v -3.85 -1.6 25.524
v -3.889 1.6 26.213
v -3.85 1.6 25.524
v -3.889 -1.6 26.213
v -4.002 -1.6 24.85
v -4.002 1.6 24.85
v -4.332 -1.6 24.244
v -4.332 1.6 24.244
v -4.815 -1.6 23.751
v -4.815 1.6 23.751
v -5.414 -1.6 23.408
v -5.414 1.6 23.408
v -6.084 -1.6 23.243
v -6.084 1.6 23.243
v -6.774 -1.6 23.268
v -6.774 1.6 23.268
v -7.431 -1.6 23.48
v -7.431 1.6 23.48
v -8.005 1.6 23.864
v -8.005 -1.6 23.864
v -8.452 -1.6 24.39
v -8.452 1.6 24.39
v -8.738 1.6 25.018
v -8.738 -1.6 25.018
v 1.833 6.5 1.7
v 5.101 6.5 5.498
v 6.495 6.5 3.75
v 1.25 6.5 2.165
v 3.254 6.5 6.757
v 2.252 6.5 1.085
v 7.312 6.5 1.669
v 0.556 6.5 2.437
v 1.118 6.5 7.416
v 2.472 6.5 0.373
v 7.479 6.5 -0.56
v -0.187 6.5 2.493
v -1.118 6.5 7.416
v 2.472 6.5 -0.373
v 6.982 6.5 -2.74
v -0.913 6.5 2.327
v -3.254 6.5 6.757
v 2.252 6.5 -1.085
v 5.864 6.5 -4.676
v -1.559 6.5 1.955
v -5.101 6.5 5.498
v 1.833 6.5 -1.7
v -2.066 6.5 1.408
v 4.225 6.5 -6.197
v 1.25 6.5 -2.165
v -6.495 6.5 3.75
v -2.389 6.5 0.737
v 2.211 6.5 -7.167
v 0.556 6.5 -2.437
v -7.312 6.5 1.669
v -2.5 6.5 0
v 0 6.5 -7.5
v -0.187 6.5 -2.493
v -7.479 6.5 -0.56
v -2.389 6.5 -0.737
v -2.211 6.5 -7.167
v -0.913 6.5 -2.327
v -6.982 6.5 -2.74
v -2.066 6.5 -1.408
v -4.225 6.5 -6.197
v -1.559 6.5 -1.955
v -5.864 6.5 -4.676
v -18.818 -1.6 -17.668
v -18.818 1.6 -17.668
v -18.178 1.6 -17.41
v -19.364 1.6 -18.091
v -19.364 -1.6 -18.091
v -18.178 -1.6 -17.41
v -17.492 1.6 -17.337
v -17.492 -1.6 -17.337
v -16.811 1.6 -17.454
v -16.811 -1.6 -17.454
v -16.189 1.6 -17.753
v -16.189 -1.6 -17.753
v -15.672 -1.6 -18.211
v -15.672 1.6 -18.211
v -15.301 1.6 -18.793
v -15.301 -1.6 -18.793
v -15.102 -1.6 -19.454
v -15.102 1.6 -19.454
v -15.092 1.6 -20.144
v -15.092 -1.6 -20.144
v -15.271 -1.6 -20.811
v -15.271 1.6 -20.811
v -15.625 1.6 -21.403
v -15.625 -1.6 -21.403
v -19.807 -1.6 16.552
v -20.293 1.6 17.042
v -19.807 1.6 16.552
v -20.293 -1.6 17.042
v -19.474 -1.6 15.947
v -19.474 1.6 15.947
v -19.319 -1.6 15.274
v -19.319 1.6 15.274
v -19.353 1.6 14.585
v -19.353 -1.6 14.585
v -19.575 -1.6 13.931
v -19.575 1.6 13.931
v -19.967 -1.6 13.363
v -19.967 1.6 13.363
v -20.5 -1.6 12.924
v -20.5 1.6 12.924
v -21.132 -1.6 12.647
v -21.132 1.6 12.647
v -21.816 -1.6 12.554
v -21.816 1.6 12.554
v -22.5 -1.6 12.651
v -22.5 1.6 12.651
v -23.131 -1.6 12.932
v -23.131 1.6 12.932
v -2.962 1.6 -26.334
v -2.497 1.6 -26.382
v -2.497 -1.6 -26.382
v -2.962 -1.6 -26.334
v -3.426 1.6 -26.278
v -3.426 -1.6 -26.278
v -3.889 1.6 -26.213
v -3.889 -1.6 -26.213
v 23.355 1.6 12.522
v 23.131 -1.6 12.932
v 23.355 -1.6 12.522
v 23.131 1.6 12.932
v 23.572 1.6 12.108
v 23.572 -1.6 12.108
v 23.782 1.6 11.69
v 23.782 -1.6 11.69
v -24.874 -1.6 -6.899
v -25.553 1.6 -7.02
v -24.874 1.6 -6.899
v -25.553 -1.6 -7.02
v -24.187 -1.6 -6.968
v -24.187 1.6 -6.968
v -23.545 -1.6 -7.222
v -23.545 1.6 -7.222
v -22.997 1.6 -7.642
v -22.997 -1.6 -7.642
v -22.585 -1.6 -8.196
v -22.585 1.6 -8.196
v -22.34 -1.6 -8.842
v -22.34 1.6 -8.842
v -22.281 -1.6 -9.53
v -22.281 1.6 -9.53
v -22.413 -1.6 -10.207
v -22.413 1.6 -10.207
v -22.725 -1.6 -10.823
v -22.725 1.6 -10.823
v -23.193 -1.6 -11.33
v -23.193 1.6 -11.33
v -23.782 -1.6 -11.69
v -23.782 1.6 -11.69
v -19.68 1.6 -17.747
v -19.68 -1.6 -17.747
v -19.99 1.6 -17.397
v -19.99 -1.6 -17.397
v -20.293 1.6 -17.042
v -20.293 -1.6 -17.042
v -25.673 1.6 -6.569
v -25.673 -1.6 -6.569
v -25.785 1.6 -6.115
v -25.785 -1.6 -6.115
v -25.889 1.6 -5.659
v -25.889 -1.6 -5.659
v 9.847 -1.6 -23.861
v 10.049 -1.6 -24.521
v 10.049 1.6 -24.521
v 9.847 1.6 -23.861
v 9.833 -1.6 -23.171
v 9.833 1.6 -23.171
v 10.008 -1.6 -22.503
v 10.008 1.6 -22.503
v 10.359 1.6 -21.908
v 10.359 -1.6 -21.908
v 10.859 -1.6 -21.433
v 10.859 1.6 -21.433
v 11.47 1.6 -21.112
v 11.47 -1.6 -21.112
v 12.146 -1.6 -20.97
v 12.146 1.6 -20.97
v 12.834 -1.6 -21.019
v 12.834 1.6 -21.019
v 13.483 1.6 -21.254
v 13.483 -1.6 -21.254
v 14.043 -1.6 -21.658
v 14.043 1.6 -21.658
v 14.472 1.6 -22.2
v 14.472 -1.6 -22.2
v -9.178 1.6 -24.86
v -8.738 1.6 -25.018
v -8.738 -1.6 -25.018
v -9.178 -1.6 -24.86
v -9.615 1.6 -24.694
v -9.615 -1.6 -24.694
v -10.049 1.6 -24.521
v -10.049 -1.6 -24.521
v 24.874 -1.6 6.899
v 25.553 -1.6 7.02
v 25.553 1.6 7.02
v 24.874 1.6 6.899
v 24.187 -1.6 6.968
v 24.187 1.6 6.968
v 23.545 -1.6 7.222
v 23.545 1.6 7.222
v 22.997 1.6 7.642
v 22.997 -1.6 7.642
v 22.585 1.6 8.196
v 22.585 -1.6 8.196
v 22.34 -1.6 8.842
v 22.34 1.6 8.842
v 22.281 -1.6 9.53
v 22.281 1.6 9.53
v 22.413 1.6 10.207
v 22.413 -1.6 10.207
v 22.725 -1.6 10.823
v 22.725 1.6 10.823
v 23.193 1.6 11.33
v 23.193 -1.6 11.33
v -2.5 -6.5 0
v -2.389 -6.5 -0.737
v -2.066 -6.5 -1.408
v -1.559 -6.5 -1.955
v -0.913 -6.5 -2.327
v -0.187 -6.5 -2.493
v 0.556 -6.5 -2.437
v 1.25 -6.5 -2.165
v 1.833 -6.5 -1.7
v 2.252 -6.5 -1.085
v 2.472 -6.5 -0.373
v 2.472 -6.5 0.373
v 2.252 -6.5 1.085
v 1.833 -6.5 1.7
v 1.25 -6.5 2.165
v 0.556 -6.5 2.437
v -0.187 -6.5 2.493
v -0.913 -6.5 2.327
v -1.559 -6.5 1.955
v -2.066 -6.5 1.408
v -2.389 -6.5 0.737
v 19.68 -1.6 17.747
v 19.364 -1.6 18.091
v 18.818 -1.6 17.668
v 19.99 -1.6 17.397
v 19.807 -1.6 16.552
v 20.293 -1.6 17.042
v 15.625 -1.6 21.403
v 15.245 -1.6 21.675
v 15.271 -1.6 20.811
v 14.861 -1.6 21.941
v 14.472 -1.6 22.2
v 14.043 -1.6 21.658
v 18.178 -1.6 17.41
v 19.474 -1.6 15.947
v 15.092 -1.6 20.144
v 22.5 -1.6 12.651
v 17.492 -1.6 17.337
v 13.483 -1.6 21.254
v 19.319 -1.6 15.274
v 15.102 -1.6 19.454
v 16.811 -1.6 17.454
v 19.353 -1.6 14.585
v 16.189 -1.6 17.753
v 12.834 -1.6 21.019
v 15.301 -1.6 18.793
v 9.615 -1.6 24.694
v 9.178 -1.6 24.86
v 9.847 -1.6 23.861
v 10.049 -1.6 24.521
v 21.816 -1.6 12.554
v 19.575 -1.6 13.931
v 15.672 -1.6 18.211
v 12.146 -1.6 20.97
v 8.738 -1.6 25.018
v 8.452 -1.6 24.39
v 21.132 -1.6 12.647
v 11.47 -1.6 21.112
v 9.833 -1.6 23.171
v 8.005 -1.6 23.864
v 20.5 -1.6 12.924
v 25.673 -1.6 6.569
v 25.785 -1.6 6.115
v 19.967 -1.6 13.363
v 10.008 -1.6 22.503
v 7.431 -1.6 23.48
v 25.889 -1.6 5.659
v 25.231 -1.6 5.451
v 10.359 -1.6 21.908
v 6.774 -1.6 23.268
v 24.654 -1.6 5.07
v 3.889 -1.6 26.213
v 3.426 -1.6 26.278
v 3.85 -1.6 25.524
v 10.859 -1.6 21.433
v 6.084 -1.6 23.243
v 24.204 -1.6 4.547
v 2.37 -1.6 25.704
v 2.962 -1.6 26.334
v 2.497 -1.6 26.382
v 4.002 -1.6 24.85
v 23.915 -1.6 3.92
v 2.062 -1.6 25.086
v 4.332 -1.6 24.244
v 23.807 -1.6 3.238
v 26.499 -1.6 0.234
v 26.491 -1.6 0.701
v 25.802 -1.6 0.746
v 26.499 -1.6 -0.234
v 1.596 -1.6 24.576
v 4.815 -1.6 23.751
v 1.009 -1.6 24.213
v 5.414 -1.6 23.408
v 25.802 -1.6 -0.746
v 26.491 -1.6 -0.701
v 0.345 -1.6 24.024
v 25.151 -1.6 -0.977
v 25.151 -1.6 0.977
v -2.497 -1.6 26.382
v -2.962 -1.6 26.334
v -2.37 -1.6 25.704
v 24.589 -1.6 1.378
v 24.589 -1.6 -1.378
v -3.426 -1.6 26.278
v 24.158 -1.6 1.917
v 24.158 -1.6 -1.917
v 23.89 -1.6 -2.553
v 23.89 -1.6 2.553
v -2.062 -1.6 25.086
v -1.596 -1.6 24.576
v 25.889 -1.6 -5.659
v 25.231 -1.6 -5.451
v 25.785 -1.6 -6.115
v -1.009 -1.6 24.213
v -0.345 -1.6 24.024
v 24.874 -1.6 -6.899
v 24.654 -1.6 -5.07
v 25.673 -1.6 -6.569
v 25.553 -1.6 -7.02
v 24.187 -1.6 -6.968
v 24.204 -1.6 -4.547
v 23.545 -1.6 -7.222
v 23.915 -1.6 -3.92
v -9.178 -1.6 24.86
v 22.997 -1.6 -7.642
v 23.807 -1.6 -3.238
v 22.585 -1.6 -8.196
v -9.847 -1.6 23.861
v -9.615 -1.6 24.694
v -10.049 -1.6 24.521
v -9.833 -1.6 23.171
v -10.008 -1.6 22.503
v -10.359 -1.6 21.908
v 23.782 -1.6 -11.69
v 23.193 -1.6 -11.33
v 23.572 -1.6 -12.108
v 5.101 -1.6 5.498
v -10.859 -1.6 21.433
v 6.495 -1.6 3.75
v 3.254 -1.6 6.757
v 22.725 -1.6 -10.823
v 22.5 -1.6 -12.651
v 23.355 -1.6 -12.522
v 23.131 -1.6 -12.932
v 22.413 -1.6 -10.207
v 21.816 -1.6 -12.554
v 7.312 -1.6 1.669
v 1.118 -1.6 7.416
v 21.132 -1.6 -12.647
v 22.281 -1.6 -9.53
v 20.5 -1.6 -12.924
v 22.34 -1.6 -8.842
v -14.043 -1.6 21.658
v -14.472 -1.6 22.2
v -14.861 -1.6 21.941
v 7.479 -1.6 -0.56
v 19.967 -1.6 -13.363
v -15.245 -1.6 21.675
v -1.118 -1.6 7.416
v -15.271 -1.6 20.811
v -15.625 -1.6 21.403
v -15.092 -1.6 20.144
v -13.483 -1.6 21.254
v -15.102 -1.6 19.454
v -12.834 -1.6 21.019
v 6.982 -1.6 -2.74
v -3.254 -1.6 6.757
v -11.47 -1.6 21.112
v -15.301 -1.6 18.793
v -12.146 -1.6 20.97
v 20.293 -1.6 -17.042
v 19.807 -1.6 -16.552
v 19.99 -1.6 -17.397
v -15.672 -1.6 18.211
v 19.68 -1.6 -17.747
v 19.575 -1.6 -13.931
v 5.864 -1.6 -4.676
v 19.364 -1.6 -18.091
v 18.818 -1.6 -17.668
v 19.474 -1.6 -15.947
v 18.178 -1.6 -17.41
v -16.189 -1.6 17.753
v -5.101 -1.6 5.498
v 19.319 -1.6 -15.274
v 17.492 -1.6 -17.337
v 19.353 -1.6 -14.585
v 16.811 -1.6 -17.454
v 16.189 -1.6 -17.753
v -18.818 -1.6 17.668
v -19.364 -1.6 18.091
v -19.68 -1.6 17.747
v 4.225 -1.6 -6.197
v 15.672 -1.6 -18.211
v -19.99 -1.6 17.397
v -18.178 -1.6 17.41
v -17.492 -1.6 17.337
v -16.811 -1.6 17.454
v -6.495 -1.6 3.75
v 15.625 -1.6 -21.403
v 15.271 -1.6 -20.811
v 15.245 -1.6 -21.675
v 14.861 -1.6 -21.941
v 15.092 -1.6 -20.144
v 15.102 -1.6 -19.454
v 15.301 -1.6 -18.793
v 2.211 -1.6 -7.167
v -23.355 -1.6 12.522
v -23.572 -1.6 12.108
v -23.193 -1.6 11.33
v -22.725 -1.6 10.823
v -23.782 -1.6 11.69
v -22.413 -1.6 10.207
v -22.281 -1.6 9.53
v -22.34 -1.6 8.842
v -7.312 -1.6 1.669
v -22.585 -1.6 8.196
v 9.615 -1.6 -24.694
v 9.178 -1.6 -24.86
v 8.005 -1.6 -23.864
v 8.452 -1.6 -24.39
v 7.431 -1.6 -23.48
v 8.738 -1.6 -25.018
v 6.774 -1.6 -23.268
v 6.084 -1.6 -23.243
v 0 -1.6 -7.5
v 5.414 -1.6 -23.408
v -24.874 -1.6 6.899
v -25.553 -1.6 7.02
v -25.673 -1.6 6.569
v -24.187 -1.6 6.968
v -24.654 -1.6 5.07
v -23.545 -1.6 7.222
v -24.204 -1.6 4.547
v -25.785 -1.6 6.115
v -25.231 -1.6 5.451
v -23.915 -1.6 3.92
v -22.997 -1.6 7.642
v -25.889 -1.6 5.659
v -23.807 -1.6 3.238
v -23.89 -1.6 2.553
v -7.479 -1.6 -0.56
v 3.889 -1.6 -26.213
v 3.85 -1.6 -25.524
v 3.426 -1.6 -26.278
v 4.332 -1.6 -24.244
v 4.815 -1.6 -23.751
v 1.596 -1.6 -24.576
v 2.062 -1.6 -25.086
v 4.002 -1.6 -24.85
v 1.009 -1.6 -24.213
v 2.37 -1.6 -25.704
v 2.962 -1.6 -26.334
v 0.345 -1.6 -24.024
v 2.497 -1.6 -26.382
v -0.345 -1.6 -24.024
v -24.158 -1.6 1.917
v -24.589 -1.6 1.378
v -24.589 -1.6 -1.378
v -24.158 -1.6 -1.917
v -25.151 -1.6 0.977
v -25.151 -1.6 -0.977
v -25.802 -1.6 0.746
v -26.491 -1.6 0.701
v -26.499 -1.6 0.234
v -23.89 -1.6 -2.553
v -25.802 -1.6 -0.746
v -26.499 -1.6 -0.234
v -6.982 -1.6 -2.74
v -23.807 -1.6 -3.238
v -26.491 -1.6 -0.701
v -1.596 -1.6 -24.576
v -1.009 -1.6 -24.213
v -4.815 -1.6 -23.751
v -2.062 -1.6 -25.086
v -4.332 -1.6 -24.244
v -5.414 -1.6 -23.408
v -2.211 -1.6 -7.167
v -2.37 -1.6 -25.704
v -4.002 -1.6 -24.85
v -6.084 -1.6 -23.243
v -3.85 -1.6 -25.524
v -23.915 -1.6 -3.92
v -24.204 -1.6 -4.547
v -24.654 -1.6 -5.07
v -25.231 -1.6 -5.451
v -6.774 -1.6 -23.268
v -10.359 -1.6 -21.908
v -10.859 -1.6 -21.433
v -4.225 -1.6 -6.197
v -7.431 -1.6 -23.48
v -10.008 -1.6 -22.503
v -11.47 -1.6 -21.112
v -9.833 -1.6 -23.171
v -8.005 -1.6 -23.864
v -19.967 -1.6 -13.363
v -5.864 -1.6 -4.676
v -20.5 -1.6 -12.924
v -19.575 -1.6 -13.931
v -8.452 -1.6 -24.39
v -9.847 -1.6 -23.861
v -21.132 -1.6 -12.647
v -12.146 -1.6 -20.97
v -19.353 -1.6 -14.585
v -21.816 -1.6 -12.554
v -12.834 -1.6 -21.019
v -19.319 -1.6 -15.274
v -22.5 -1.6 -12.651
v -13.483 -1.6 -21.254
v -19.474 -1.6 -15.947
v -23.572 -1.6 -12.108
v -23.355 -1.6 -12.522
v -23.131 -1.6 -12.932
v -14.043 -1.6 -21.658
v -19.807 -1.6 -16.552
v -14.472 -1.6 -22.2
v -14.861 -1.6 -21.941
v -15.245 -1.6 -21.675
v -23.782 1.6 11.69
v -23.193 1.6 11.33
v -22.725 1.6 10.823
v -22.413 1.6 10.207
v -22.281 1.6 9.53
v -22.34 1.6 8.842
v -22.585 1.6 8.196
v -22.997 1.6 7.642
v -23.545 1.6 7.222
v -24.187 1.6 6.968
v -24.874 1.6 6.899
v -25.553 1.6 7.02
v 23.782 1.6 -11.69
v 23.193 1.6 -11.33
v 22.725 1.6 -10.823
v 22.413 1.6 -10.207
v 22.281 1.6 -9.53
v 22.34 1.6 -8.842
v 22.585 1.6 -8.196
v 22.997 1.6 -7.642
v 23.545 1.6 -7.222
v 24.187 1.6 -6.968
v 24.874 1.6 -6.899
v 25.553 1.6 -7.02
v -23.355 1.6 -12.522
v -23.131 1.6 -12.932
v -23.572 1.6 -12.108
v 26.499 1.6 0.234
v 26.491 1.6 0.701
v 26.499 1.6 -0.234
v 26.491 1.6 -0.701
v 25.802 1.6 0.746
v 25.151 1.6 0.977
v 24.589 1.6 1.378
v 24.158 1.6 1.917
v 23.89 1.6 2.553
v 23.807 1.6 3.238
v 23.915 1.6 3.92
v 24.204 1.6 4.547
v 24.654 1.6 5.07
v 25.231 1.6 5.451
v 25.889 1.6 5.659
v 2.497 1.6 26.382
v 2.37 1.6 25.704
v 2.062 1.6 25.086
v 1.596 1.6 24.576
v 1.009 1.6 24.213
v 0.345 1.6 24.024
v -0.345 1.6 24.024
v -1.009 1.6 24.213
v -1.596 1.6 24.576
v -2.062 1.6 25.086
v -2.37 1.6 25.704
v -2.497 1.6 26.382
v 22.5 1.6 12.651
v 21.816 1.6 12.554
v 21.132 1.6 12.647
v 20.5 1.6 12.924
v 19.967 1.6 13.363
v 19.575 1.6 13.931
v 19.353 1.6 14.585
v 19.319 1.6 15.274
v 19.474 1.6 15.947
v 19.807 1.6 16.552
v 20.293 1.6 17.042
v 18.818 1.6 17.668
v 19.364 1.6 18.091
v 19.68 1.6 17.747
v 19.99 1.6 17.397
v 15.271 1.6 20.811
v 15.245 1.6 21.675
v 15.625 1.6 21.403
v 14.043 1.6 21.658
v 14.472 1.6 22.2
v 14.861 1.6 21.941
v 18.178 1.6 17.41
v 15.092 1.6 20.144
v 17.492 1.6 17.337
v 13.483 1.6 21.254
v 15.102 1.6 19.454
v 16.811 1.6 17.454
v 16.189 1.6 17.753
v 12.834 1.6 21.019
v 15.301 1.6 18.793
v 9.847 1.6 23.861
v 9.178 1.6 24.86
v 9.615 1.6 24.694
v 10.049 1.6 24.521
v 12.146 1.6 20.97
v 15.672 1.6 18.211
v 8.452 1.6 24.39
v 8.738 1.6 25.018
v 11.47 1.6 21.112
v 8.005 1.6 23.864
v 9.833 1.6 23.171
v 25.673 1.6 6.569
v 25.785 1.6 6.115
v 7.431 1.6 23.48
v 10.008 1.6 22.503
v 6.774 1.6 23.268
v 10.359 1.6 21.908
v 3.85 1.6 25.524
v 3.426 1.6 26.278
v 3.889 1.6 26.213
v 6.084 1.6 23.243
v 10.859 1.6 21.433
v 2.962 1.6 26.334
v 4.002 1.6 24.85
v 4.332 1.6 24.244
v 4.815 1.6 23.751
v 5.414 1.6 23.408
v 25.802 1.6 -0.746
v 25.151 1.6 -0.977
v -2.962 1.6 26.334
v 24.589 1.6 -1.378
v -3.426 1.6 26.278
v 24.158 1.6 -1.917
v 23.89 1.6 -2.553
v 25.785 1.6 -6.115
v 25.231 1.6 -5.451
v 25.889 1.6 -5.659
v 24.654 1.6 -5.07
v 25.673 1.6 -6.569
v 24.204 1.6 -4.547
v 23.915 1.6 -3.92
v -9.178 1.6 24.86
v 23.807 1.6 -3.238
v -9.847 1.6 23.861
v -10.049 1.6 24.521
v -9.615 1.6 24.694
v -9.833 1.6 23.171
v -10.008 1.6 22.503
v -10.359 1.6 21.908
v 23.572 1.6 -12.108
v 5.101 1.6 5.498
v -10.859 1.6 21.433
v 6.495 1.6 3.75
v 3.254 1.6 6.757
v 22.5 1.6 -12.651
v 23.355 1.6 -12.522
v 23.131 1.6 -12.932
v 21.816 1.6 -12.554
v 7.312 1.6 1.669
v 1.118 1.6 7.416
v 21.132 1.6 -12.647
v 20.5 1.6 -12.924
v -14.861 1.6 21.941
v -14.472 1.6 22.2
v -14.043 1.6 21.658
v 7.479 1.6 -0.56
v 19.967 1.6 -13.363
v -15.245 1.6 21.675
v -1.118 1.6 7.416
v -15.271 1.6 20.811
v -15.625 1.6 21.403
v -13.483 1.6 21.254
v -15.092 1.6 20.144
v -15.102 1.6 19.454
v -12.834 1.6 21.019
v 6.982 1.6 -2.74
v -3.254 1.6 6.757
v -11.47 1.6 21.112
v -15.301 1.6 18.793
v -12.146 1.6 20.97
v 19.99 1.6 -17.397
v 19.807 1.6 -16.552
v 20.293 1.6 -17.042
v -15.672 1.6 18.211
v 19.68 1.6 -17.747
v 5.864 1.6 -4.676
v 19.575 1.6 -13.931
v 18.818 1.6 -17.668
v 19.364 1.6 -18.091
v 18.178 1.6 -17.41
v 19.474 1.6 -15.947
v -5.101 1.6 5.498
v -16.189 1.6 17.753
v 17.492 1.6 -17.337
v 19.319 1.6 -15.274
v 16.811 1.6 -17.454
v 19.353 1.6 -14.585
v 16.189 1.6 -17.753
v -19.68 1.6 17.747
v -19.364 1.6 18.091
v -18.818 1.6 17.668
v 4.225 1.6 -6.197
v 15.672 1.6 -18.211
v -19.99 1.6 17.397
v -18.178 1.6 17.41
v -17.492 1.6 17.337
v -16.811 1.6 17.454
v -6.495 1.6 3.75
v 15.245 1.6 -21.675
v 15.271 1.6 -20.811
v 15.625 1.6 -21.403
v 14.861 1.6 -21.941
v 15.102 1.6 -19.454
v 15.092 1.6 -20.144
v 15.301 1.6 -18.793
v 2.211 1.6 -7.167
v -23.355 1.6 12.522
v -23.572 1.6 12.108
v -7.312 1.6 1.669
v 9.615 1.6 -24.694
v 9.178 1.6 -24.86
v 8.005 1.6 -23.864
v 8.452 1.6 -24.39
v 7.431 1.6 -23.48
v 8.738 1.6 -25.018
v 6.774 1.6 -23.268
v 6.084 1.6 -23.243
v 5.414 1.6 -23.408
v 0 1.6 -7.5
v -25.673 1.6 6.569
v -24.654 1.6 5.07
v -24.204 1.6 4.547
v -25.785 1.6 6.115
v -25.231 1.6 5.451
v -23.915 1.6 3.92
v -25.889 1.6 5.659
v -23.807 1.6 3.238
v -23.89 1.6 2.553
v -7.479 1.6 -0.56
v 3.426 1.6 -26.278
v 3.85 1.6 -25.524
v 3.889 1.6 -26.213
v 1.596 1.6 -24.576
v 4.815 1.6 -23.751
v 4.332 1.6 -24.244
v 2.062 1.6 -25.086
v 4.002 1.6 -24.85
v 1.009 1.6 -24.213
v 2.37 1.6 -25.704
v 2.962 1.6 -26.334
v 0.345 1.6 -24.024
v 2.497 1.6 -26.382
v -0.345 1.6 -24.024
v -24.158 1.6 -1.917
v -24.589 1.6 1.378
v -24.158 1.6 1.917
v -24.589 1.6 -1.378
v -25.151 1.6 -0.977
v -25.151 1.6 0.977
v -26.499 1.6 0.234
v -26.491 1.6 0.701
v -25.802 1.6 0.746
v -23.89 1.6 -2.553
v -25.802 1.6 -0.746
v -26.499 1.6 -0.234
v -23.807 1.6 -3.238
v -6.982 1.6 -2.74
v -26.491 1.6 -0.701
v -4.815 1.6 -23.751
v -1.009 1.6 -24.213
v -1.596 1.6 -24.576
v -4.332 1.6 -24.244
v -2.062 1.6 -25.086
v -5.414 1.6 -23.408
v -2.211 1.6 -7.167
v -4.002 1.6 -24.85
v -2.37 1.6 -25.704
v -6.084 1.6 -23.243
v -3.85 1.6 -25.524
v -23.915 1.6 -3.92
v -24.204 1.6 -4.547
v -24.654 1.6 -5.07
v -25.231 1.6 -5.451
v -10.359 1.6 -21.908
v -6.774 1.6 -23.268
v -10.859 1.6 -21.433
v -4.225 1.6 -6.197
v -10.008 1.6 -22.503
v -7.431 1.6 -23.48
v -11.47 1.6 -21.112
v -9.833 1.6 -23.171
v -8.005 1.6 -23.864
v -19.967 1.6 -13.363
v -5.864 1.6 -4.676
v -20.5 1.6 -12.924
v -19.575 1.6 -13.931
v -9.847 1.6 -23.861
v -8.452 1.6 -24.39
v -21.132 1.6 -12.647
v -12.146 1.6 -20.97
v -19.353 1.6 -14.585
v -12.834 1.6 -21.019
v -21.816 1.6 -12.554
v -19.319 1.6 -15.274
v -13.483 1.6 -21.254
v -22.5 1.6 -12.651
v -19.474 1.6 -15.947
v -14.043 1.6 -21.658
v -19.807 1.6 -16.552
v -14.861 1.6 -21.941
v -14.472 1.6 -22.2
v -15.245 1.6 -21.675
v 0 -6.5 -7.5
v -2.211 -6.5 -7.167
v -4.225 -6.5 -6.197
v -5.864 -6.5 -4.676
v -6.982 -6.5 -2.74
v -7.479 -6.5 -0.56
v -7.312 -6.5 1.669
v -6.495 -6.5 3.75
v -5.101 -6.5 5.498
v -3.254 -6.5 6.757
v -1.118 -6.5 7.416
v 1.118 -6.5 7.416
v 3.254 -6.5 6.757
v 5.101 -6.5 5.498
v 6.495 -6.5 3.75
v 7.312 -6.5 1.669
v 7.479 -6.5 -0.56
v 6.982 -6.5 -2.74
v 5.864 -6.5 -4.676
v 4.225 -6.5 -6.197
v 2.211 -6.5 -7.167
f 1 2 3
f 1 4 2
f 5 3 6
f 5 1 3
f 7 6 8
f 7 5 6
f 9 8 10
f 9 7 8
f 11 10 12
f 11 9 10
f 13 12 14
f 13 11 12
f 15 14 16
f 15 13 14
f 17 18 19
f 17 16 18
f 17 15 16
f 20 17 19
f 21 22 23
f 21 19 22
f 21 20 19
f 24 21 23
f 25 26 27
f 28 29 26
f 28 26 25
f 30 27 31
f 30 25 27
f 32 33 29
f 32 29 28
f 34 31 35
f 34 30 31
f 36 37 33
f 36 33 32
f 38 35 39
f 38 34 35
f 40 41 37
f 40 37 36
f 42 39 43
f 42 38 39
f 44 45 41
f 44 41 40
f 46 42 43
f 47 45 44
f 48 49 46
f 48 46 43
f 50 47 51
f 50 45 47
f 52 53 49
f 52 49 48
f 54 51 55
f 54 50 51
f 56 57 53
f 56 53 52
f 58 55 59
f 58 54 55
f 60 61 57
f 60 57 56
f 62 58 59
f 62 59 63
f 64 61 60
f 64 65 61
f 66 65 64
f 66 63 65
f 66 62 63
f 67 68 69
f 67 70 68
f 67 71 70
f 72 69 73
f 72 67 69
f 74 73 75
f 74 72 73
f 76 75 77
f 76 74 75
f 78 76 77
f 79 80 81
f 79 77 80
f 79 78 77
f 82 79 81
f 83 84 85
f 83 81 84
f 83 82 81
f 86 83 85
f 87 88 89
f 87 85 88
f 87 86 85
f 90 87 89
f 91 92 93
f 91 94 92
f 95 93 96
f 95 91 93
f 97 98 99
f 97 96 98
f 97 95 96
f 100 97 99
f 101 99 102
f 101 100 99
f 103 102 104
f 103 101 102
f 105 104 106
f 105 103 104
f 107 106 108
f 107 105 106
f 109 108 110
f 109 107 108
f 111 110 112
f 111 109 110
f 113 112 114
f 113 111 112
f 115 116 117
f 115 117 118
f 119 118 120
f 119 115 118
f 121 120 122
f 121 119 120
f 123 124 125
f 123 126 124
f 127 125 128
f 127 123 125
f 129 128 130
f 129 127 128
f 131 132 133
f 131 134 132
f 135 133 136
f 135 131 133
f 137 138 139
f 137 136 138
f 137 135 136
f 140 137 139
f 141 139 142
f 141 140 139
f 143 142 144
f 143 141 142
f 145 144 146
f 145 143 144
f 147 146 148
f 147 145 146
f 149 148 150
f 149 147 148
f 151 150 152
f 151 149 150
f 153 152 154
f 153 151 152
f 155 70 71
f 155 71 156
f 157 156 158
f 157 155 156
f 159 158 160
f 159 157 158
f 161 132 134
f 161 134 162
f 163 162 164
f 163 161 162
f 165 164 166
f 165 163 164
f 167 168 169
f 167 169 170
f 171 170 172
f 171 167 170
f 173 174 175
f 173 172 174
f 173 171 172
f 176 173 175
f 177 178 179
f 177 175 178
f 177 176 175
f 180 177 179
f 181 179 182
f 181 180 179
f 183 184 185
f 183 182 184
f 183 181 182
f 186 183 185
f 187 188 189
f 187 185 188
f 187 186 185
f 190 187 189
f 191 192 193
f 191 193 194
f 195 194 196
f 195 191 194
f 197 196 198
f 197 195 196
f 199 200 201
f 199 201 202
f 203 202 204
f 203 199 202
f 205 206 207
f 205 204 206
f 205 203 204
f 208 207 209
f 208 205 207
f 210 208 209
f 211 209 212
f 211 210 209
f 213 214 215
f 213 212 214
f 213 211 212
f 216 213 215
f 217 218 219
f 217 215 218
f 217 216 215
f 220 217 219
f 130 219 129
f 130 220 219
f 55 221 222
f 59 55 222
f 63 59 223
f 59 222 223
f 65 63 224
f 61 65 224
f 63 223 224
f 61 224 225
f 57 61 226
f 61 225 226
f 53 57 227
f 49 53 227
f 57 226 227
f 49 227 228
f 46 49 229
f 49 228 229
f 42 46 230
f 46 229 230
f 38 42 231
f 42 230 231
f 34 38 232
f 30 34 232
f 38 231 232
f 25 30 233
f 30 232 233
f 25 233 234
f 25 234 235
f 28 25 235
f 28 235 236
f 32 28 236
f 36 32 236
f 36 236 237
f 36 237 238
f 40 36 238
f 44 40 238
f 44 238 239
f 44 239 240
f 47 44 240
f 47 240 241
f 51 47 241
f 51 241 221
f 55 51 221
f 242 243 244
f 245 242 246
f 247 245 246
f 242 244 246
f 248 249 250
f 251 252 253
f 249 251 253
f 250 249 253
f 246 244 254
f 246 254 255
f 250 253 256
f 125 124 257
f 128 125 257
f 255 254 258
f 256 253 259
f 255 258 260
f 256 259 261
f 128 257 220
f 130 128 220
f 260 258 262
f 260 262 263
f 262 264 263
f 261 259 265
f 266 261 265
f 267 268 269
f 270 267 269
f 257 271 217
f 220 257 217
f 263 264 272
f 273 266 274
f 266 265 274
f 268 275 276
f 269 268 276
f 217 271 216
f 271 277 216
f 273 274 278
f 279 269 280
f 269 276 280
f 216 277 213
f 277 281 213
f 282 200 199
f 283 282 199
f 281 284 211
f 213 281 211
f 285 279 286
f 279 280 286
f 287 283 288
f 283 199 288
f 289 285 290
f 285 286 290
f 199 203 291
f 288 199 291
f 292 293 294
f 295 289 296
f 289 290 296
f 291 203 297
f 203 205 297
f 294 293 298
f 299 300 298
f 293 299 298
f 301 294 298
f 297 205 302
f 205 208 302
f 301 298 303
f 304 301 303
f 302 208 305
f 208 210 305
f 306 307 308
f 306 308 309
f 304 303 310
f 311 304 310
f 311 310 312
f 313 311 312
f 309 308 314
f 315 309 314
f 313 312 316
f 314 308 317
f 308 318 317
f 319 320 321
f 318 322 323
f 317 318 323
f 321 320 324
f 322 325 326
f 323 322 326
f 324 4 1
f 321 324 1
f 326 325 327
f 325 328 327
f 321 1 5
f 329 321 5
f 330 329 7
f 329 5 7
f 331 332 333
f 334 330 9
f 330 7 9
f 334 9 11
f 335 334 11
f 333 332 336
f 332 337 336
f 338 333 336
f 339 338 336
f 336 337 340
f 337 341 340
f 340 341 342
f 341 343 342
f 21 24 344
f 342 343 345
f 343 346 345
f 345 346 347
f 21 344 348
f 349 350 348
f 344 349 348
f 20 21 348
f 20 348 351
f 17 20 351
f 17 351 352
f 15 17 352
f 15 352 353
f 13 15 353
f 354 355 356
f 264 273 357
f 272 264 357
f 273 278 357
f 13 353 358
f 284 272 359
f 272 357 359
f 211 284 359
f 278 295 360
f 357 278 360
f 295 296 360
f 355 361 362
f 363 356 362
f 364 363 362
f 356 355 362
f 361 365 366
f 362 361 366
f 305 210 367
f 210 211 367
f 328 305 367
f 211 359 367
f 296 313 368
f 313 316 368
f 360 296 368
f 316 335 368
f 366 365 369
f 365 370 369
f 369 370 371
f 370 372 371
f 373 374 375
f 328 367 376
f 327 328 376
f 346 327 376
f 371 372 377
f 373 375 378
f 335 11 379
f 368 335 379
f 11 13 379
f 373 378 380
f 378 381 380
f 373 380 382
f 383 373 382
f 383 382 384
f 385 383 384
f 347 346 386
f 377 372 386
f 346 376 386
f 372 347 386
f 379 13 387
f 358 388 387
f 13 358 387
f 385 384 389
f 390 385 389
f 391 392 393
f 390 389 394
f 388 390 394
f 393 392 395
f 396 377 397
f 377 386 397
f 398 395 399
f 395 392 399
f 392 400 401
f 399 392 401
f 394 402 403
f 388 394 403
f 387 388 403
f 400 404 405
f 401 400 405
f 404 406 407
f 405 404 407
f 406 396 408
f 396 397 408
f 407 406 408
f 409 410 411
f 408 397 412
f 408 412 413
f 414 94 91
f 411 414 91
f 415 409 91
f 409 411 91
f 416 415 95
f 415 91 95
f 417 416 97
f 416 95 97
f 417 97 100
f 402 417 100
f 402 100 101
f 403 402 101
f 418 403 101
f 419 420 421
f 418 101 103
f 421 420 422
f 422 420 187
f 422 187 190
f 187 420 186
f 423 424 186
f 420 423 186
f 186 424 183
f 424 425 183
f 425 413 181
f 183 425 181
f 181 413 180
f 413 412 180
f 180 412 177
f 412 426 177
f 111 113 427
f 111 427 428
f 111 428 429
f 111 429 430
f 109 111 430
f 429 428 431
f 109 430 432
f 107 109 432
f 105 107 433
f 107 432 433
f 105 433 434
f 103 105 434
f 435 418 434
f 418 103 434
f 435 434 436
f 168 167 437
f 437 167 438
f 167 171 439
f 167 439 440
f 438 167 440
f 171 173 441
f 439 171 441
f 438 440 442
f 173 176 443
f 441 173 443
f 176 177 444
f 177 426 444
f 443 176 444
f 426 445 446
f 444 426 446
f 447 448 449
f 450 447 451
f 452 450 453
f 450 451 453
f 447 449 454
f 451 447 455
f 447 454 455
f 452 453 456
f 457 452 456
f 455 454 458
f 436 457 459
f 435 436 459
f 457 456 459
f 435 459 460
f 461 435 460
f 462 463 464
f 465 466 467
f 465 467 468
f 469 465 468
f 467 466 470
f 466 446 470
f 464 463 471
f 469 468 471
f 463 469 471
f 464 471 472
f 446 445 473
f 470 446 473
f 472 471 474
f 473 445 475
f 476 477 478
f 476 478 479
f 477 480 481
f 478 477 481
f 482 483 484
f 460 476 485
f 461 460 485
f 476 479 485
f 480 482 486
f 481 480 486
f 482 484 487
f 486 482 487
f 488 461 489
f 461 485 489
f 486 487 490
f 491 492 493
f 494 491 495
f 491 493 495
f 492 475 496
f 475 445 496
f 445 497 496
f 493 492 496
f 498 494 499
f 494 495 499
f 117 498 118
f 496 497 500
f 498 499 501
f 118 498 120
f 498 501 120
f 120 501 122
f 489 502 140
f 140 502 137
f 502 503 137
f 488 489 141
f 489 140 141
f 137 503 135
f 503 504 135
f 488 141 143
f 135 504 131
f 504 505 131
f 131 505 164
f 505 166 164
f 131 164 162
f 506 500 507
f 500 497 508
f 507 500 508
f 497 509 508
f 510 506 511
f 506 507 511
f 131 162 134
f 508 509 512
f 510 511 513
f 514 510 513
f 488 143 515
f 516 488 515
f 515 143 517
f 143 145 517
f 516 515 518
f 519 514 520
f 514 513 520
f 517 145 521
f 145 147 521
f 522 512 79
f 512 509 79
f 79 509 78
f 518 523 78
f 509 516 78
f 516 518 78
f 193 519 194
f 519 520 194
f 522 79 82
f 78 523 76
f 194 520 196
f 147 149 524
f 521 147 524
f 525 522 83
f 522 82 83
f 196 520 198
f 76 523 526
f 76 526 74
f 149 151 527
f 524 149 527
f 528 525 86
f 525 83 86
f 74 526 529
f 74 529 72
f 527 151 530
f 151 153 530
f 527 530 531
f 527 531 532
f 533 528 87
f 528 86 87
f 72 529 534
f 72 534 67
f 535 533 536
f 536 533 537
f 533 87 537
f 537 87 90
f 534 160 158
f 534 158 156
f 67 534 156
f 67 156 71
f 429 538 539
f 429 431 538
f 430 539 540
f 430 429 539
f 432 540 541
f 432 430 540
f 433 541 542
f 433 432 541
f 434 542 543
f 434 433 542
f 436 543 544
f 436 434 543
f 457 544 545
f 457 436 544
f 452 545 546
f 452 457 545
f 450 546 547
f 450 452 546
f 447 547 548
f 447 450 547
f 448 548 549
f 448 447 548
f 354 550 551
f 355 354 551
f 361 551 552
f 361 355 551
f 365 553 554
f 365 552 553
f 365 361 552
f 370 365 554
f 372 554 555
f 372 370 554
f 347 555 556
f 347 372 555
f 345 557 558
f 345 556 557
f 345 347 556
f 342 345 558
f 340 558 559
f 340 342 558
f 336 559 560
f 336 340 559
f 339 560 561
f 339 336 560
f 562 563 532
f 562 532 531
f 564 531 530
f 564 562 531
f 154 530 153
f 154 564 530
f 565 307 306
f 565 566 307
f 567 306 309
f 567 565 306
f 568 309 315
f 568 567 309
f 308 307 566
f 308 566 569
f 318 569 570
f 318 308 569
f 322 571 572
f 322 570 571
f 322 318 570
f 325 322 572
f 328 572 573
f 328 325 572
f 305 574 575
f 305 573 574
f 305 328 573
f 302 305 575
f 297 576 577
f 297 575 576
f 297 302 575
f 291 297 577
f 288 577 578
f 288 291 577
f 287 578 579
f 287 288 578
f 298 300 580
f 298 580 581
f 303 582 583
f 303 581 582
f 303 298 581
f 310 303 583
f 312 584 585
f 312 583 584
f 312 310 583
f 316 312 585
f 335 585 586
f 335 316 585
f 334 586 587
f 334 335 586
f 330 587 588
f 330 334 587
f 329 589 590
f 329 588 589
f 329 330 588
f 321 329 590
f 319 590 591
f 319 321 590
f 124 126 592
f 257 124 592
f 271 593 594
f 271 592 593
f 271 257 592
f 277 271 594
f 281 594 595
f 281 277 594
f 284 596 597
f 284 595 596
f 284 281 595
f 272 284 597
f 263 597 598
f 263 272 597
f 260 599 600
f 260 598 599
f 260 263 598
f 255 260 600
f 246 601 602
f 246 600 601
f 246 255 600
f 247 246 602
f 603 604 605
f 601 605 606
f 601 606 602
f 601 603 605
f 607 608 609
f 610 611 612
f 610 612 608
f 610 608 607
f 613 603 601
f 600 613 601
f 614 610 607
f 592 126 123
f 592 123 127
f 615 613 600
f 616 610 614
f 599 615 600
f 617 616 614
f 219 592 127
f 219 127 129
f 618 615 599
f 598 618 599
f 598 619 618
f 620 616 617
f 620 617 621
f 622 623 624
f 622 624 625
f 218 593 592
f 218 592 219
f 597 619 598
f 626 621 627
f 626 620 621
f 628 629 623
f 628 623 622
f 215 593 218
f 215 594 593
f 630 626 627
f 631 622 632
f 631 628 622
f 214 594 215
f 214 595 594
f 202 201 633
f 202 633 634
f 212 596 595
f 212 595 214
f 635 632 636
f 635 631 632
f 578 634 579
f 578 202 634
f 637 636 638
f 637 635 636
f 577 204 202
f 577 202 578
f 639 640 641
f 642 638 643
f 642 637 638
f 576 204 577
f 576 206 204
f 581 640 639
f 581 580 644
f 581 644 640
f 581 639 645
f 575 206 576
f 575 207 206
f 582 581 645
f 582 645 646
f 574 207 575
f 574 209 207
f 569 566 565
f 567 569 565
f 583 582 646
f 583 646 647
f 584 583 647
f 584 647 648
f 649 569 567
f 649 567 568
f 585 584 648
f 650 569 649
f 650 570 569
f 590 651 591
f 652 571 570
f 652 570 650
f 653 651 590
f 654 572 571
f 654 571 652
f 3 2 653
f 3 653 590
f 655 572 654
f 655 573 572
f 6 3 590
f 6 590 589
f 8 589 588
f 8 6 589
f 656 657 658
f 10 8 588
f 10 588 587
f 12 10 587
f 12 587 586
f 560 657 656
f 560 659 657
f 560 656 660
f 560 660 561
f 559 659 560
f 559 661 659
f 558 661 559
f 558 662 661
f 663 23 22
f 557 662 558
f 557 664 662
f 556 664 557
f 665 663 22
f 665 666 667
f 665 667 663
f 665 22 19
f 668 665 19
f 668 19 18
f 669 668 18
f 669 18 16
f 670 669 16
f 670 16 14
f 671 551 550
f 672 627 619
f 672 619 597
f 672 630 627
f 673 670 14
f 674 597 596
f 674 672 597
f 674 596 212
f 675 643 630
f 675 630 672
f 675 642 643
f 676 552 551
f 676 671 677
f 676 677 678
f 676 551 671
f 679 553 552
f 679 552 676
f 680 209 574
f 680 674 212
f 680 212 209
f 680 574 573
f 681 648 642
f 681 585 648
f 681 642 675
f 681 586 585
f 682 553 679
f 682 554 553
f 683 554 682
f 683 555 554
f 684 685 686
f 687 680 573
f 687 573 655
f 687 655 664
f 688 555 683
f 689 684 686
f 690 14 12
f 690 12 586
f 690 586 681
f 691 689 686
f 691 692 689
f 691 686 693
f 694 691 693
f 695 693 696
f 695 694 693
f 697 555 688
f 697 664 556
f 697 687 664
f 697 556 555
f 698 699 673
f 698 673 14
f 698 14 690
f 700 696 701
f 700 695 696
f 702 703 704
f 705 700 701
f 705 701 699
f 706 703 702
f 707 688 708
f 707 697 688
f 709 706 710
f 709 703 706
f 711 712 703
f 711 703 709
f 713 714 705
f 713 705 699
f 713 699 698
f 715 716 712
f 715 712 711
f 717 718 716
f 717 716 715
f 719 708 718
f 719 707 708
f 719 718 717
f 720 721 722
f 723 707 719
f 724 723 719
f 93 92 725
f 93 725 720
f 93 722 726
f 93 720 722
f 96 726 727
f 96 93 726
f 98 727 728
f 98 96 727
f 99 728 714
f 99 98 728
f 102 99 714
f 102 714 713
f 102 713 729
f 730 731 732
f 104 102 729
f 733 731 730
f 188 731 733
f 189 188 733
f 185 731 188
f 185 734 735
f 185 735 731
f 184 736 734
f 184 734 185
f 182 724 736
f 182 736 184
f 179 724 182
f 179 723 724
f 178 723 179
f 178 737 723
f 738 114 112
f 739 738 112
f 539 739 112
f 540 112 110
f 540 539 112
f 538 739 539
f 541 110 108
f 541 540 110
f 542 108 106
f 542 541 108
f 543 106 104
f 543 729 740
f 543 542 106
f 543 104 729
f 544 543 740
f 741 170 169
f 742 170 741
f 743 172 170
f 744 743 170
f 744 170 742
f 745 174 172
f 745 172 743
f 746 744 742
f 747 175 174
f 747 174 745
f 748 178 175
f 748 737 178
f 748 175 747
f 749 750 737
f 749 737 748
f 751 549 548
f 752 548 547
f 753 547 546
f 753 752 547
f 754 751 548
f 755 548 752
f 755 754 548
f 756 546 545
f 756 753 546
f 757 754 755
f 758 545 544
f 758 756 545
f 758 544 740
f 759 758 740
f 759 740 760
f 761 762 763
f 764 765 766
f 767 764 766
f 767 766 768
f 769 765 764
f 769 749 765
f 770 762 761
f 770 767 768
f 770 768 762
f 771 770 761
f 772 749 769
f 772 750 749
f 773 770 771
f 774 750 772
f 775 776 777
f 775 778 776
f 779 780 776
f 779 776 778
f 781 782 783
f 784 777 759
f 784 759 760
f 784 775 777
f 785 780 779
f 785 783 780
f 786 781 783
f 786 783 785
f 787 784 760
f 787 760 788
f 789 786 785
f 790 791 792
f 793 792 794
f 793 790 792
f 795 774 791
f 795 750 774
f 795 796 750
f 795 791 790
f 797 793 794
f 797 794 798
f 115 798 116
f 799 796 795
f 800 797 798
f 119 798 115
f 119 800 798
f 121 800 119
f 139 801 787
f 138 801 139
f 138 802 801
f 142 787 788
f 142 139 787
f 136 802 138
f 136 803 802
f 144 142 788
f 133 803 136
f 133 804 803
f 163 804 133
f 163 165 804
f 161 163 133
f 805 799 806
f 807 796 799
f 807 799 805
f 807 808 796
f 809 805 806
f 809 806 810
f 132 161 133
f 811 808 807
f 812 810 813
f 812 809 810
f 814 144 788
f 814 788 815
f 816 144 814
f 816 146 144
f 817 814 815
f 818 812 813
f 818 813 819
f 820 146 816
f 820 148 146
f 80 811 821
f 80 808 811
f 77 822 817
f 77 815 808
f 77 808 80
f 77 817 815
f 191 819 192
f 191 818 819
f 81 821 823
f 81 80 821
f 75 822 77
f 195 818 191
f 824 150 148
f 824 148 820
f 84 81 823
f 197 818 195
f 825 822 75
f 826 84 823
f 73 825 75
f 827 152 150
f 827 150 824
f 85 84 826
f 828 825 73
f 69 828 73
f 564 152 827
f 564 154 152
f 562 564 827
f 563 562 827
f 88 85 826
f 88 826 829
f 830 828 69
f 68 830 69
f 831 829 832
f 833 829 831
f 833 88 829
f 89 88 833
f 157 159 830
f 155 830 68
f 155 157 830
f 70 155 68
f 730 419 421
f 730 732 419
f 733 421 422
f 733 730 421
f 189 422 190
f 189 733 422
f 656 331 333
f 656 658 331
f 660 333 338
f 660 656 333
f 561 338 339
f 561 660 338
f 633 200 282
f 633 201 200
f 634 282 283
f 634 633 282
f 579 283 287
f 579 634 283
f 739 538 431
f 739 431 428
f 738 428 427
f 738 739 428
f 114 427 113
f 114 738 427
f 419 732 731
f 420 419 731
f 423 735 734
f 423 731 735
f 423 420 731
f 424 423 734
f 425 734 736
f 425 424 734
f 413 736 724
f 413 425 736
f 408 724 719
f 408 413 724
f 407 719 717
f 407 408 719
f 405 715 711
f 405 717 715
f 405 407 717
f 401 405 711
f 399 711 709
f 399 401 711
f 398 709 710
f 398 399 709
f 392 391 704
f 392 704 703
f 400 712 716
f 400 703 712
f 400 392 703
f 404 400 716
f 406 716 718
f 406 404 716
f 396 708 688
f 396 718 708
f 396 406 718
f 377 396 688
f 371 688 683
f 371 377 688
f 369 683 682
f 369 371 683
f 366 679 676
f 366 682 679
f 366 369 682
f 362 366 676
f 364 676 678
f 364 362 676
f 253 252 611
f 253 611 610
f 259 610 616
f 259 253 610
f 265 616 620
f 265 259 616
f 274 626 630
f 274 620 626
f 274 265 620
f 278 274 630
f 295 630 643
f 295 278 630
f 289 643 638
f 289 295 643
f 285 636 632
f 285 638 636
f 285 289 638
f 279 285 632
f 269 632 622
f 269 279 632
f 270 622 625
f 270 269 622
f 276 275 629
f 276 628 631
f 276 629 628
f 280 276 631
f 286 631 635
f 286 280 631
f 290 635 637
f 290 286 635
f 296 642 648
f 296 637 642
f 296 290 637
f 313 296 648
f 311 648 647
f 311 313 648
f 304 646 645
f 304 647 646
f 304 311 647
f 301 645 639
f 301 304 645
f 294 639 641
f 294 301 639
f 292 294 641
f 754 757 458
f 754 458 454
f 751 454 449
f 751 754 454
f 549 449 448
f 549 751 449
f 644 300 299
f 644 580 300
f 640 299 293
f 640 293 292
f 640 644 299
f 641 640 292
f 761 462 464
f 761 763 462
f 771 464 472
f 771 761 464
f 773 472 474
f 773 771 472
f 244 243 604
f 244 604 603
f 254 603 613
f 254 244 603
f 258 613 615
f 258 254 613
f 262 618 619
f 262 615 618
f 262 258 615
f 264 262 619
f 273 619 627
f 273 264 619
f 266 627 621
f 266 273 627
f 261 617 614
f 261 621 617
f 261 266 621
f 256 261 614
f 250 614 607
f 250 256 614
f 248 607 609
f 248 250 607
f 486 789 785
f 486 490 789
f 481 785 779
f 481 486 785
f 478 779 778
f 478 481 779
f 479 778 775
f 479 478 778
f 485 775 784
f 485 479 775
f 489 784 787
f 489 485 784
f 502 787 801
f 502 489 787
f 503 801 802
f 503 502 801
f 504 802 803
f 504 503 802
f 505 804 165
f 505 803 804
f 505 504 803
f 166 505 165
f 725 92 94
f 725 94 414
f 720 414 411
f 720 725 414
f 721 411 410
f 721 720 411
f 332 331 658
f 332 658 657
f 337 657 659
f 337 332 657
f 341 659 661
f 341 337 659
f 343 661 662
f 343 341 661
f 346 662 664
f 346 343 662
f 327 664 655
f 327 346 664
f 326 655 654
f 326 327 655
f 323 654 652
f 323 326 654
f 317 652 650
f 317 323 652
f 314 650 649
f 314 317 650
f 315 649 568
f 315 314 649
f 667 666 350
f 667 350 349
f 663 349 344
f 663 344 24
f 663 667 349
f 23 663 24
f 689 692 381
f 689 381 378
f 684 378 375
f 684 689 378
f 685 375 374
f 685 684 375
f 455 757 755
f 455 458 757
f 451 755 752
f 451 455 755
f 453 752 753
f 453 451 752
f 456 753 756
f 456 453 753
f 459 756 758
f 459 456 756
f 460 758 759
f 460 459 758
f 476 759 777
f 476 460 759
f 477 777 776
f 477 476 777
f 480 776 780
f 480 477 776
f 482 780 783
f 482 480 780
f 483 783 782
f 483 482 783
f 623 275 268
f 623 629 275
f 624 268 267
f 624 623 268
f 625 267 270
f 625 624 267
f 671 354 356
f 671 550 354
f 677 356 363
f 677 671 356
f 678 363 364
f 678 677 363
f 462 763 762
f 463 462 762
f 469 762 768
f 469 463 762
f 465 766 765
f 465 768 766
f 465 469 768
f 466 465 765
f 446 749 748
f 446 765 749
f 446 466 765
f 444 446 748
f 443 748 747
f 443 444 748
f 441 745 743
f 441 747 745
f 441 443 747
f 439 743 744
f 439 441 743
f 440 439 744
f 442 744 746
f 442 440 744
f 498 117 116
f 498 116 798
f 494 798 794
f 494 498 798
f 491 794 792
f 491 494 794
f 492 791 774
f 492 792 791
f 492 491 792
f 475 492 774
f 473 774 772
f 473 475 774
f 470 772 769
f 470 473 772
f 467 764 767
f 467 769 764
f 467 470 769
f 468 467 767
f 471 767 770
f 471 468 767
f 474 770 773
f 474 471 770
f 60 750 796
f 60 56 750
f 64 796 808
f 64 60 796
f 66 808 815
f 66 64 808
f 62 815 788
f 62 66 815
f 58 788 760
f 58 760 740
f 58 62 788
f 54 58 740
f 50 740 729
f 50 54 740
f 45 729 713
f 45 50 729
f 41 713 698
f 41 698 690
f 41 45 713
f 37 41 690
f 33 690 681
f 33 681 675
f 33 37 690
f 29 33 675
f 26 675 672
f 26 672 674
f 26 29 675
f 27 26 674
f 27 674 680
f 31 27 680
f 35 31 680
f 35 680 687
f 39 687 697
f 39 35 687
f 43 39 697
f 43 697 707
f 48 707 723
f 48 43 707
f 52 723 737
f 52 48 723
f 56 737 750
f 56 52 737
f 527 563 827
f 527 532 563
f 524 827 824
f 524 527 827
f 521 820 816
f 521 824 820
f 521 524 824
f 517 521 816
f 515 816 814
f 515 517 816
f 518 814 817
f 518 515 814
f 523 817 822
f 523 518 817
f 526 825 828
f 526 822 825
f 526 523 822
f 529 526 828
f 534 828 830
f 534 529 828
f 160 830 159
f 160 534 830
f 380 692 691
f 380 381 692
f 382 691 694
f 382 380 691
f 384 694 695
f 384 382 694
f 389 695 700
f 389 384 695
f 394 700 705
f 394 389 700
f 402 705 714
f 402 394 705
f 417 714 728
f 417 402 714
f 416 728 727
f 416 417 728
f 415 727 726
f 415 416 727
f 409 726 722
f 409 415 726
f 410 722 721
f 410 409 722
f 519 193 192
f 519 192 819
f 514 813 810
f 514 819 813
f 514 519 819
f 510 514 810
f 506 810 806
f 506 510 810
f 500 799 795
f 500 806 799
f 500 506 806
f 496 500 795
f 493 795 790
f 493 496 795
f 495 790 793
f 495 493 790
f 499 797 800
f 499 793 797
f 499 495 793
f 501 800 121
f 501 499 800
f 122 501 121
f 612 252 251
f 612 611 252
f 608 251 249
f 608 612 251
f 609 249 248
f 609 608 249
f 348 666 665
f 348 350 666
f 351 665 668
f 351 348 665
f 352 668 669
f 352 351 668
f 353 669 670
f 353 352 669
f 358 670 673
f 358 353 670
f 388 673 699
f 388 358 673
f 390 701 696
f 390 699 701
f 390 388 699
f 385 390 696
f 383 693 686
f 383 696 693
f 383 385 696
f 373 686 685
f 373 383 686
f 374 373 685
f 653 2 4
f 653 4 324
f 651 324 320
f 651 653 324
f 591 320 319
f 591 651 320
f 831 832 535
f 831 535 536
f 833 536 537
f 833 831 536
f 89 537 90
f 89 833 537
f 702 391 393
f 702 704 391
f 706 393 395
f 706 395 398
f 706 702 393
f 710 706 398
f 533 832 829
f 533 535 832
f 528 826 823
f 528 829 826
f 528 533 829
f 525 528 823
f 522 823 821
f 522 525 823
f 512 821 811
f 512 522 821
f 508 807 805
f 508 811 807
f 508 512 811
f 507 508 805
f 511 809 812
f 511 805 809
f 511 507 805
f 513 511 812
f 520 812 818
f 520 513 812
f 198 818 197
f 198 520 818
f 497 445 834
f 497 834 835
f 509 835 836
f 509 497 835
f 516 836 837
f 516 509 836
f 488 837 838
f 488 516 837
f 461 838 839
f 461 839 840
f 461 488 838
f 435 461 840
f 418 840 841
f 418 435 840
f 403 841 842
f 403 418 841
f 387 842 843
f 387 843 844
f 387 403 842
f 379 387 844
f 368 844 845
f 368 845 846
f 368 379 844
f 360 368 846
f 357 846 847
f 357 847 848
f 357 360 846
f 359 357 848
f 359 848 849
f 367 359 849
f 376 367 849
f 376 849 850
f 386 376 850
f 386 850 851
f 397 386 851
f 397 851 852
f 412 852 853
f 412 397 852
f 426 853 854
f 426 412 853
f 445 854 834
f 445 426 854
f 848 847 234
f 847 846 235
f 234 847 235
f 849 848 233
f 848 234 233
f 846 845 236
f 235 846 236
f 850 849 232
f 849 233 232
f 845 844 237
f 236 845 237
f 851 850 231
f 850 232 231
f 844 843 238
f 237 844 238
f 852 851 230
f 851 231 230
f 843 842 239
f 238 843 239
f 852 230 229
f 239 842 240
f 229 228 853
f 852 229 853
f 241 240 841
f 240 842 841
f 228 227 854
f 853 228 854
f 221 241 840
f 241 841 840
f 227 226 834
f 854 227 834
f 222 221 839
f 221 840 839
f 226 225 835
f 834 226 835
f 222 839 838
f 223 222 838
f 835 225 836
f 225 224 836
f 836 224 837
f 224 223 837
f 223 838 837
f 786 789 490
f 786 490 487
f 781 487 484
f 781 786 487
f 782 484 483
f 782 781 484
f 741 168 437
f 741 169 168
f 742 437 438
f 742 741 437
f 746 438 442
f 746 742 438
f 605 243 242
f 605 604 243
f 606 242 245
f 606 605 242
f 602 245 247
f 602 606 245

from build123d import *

# Parameters (mm, degrees)
SKETCH2_R               = 26.5
BOSS_EXTRUDE1_DEPTH     = 1.6
CUT_EXTRUDE2_DEPTH      = 38.510798445
CUT_EXTRUDE2_DEPTH_BACK = 38.510798445
SKETCH1_R               = 2.5
SKETCH3_R               = 7.5
BOSS_EXTRUDE2_DEPTH     = 6.5
F_5_0MM_DOWEL_HOLE2_D   = 5


with BuildPart() as part:
    # Sketch2 → Boss-Extrude1 (new, symmetric)
    with BuildSketch(Plane(origin=(0, 0, 0), x_dir=(1, 0, 0), z_dir=(0, 1, 0))):
        with Locations(Location((0, 0, 0), (0, 0, 90))):
            Circle(SKETCH2_R)
    extrude(amount=BOSS_EXTRUDE1_DEPTH, both=True)

    # Sketch1 → Cut-Extrude2 (cut, two sides: drawn at the far end of the back side and taken through both)
    with BuildSketch(Plane(origin=(0, 0, 0), x_dir=(1, 0, 0), z_dir=(0, 1, 0)).offset(-CUT_EXTRUDE2_DEPTH_BACK)):
        with Locations((0, 26.5)):
            Circle(SKETCH1_R)
        with Locations((6.341865104, 25.729958162)):
            Circle(SKETCH1_R)
        with Locations((12.315164059, 23.46458468)):
            Circle(SKETCH1_R)
        with Locations((17.572750443, 19.835534827)):
            Circle(SKETCH1_R)
        with Locations((21.809072446, 15.053715788)):
            Circle(SKETCH1_R)
        with Locations((24.777930431, 9.397029507)):
            Circle(SKETCH1_R)
        with Locations((26.306785164, 3.194222027)):
            Circle(SKETCH1_R)
        with Locations((26.306785164, -3.194222027)):
            Circle(SKETCH1_R)
        with Locations((24.777930431, -9.397029507)):
            Circle(SKETCH1_R)
        with Locations((21.809072446, -15.053715788)):
            Circle(SKETCH1_R)
        with Locations((17.572750443, -19.835534827)):
            Circle(SKETCH1_R)
        with Locations((12.315164059, -23.46458468)):
            Circle(SKETCH1_R)
        with Locations((6.341865104, -25.729958162)):
            Circle(SKETCH1_R)
        with Locations((0, -26.5)):
            Circle(SKETCH1_R)
        with Locations((-6.341865104, -25.729958162)):
            Circle(SKETCH1_R)
        with Locations((-12.315164059, -23.46458468)):
            Circle(SKETCH1_R)
        with Locations((-17.572750443, -19.835534827)):
            Circle(SKETCH1_R)
        with Locations((-21.809072446, -15.053715788)):
            Circle(SKETCH1_R)
        with Locations((-24.777930431, -9.397029507)):
            Circle(SKETCH1_R)
        with Locations((-26.306785164, -3.194222027)):
            Circle(SKETCH1_R)
        with Locations((-26.306785164, 3.194222027)):
            Circle(SKETCH1_R)
        with Locations((-24.777930431, 9.397029507)):
            Circle(SKETCH1_R)
        with Locations((-21.809072446, 15.053715788)):
            Circle(SKETCH1_R)
        with Locations((-17.572750443, 19.835534827)):
            Circle(SKETCH1_R)
        with Locations((-12.315164059, 23.46458468)):
            Circle(SKETCH1_R)
        with Locations((-6.341865104, 25.729958162)):
            Circle(SKETCH1_R)
    extrude(amount=CUT_EXTRUDE2_DEPTH + CUT_EXTRUDE2_DEPTH_BACK, mode=Mode.SUBTRACT)

    # Sketch3 → Boss-Extrude2 (add, symmetric)
    with BuildSketch(Plane(origin=(0, 0, 0), x_dir=(1, 0, 0), z_dir=(0, 1, 0))):
        with Locations(Location((0, 0, 0), (0, 0, 90))):
            Circle(SKETCH3_R)
    extrude(amount=BOSS_EXTRUDE2_DEPTH, both=True)

    # Ø5.0mm Dowel Hole2 (through all)
    with Locations(Plane(origin=(0, 6.5, 0), x_dir=(1, 0, 0), z_dir=(0, 1, 0))):
        with Locations((0, 0)):
            Hole(F_5_0MM_DOWEL_HOLE2_D / 2)


solid = part.part
